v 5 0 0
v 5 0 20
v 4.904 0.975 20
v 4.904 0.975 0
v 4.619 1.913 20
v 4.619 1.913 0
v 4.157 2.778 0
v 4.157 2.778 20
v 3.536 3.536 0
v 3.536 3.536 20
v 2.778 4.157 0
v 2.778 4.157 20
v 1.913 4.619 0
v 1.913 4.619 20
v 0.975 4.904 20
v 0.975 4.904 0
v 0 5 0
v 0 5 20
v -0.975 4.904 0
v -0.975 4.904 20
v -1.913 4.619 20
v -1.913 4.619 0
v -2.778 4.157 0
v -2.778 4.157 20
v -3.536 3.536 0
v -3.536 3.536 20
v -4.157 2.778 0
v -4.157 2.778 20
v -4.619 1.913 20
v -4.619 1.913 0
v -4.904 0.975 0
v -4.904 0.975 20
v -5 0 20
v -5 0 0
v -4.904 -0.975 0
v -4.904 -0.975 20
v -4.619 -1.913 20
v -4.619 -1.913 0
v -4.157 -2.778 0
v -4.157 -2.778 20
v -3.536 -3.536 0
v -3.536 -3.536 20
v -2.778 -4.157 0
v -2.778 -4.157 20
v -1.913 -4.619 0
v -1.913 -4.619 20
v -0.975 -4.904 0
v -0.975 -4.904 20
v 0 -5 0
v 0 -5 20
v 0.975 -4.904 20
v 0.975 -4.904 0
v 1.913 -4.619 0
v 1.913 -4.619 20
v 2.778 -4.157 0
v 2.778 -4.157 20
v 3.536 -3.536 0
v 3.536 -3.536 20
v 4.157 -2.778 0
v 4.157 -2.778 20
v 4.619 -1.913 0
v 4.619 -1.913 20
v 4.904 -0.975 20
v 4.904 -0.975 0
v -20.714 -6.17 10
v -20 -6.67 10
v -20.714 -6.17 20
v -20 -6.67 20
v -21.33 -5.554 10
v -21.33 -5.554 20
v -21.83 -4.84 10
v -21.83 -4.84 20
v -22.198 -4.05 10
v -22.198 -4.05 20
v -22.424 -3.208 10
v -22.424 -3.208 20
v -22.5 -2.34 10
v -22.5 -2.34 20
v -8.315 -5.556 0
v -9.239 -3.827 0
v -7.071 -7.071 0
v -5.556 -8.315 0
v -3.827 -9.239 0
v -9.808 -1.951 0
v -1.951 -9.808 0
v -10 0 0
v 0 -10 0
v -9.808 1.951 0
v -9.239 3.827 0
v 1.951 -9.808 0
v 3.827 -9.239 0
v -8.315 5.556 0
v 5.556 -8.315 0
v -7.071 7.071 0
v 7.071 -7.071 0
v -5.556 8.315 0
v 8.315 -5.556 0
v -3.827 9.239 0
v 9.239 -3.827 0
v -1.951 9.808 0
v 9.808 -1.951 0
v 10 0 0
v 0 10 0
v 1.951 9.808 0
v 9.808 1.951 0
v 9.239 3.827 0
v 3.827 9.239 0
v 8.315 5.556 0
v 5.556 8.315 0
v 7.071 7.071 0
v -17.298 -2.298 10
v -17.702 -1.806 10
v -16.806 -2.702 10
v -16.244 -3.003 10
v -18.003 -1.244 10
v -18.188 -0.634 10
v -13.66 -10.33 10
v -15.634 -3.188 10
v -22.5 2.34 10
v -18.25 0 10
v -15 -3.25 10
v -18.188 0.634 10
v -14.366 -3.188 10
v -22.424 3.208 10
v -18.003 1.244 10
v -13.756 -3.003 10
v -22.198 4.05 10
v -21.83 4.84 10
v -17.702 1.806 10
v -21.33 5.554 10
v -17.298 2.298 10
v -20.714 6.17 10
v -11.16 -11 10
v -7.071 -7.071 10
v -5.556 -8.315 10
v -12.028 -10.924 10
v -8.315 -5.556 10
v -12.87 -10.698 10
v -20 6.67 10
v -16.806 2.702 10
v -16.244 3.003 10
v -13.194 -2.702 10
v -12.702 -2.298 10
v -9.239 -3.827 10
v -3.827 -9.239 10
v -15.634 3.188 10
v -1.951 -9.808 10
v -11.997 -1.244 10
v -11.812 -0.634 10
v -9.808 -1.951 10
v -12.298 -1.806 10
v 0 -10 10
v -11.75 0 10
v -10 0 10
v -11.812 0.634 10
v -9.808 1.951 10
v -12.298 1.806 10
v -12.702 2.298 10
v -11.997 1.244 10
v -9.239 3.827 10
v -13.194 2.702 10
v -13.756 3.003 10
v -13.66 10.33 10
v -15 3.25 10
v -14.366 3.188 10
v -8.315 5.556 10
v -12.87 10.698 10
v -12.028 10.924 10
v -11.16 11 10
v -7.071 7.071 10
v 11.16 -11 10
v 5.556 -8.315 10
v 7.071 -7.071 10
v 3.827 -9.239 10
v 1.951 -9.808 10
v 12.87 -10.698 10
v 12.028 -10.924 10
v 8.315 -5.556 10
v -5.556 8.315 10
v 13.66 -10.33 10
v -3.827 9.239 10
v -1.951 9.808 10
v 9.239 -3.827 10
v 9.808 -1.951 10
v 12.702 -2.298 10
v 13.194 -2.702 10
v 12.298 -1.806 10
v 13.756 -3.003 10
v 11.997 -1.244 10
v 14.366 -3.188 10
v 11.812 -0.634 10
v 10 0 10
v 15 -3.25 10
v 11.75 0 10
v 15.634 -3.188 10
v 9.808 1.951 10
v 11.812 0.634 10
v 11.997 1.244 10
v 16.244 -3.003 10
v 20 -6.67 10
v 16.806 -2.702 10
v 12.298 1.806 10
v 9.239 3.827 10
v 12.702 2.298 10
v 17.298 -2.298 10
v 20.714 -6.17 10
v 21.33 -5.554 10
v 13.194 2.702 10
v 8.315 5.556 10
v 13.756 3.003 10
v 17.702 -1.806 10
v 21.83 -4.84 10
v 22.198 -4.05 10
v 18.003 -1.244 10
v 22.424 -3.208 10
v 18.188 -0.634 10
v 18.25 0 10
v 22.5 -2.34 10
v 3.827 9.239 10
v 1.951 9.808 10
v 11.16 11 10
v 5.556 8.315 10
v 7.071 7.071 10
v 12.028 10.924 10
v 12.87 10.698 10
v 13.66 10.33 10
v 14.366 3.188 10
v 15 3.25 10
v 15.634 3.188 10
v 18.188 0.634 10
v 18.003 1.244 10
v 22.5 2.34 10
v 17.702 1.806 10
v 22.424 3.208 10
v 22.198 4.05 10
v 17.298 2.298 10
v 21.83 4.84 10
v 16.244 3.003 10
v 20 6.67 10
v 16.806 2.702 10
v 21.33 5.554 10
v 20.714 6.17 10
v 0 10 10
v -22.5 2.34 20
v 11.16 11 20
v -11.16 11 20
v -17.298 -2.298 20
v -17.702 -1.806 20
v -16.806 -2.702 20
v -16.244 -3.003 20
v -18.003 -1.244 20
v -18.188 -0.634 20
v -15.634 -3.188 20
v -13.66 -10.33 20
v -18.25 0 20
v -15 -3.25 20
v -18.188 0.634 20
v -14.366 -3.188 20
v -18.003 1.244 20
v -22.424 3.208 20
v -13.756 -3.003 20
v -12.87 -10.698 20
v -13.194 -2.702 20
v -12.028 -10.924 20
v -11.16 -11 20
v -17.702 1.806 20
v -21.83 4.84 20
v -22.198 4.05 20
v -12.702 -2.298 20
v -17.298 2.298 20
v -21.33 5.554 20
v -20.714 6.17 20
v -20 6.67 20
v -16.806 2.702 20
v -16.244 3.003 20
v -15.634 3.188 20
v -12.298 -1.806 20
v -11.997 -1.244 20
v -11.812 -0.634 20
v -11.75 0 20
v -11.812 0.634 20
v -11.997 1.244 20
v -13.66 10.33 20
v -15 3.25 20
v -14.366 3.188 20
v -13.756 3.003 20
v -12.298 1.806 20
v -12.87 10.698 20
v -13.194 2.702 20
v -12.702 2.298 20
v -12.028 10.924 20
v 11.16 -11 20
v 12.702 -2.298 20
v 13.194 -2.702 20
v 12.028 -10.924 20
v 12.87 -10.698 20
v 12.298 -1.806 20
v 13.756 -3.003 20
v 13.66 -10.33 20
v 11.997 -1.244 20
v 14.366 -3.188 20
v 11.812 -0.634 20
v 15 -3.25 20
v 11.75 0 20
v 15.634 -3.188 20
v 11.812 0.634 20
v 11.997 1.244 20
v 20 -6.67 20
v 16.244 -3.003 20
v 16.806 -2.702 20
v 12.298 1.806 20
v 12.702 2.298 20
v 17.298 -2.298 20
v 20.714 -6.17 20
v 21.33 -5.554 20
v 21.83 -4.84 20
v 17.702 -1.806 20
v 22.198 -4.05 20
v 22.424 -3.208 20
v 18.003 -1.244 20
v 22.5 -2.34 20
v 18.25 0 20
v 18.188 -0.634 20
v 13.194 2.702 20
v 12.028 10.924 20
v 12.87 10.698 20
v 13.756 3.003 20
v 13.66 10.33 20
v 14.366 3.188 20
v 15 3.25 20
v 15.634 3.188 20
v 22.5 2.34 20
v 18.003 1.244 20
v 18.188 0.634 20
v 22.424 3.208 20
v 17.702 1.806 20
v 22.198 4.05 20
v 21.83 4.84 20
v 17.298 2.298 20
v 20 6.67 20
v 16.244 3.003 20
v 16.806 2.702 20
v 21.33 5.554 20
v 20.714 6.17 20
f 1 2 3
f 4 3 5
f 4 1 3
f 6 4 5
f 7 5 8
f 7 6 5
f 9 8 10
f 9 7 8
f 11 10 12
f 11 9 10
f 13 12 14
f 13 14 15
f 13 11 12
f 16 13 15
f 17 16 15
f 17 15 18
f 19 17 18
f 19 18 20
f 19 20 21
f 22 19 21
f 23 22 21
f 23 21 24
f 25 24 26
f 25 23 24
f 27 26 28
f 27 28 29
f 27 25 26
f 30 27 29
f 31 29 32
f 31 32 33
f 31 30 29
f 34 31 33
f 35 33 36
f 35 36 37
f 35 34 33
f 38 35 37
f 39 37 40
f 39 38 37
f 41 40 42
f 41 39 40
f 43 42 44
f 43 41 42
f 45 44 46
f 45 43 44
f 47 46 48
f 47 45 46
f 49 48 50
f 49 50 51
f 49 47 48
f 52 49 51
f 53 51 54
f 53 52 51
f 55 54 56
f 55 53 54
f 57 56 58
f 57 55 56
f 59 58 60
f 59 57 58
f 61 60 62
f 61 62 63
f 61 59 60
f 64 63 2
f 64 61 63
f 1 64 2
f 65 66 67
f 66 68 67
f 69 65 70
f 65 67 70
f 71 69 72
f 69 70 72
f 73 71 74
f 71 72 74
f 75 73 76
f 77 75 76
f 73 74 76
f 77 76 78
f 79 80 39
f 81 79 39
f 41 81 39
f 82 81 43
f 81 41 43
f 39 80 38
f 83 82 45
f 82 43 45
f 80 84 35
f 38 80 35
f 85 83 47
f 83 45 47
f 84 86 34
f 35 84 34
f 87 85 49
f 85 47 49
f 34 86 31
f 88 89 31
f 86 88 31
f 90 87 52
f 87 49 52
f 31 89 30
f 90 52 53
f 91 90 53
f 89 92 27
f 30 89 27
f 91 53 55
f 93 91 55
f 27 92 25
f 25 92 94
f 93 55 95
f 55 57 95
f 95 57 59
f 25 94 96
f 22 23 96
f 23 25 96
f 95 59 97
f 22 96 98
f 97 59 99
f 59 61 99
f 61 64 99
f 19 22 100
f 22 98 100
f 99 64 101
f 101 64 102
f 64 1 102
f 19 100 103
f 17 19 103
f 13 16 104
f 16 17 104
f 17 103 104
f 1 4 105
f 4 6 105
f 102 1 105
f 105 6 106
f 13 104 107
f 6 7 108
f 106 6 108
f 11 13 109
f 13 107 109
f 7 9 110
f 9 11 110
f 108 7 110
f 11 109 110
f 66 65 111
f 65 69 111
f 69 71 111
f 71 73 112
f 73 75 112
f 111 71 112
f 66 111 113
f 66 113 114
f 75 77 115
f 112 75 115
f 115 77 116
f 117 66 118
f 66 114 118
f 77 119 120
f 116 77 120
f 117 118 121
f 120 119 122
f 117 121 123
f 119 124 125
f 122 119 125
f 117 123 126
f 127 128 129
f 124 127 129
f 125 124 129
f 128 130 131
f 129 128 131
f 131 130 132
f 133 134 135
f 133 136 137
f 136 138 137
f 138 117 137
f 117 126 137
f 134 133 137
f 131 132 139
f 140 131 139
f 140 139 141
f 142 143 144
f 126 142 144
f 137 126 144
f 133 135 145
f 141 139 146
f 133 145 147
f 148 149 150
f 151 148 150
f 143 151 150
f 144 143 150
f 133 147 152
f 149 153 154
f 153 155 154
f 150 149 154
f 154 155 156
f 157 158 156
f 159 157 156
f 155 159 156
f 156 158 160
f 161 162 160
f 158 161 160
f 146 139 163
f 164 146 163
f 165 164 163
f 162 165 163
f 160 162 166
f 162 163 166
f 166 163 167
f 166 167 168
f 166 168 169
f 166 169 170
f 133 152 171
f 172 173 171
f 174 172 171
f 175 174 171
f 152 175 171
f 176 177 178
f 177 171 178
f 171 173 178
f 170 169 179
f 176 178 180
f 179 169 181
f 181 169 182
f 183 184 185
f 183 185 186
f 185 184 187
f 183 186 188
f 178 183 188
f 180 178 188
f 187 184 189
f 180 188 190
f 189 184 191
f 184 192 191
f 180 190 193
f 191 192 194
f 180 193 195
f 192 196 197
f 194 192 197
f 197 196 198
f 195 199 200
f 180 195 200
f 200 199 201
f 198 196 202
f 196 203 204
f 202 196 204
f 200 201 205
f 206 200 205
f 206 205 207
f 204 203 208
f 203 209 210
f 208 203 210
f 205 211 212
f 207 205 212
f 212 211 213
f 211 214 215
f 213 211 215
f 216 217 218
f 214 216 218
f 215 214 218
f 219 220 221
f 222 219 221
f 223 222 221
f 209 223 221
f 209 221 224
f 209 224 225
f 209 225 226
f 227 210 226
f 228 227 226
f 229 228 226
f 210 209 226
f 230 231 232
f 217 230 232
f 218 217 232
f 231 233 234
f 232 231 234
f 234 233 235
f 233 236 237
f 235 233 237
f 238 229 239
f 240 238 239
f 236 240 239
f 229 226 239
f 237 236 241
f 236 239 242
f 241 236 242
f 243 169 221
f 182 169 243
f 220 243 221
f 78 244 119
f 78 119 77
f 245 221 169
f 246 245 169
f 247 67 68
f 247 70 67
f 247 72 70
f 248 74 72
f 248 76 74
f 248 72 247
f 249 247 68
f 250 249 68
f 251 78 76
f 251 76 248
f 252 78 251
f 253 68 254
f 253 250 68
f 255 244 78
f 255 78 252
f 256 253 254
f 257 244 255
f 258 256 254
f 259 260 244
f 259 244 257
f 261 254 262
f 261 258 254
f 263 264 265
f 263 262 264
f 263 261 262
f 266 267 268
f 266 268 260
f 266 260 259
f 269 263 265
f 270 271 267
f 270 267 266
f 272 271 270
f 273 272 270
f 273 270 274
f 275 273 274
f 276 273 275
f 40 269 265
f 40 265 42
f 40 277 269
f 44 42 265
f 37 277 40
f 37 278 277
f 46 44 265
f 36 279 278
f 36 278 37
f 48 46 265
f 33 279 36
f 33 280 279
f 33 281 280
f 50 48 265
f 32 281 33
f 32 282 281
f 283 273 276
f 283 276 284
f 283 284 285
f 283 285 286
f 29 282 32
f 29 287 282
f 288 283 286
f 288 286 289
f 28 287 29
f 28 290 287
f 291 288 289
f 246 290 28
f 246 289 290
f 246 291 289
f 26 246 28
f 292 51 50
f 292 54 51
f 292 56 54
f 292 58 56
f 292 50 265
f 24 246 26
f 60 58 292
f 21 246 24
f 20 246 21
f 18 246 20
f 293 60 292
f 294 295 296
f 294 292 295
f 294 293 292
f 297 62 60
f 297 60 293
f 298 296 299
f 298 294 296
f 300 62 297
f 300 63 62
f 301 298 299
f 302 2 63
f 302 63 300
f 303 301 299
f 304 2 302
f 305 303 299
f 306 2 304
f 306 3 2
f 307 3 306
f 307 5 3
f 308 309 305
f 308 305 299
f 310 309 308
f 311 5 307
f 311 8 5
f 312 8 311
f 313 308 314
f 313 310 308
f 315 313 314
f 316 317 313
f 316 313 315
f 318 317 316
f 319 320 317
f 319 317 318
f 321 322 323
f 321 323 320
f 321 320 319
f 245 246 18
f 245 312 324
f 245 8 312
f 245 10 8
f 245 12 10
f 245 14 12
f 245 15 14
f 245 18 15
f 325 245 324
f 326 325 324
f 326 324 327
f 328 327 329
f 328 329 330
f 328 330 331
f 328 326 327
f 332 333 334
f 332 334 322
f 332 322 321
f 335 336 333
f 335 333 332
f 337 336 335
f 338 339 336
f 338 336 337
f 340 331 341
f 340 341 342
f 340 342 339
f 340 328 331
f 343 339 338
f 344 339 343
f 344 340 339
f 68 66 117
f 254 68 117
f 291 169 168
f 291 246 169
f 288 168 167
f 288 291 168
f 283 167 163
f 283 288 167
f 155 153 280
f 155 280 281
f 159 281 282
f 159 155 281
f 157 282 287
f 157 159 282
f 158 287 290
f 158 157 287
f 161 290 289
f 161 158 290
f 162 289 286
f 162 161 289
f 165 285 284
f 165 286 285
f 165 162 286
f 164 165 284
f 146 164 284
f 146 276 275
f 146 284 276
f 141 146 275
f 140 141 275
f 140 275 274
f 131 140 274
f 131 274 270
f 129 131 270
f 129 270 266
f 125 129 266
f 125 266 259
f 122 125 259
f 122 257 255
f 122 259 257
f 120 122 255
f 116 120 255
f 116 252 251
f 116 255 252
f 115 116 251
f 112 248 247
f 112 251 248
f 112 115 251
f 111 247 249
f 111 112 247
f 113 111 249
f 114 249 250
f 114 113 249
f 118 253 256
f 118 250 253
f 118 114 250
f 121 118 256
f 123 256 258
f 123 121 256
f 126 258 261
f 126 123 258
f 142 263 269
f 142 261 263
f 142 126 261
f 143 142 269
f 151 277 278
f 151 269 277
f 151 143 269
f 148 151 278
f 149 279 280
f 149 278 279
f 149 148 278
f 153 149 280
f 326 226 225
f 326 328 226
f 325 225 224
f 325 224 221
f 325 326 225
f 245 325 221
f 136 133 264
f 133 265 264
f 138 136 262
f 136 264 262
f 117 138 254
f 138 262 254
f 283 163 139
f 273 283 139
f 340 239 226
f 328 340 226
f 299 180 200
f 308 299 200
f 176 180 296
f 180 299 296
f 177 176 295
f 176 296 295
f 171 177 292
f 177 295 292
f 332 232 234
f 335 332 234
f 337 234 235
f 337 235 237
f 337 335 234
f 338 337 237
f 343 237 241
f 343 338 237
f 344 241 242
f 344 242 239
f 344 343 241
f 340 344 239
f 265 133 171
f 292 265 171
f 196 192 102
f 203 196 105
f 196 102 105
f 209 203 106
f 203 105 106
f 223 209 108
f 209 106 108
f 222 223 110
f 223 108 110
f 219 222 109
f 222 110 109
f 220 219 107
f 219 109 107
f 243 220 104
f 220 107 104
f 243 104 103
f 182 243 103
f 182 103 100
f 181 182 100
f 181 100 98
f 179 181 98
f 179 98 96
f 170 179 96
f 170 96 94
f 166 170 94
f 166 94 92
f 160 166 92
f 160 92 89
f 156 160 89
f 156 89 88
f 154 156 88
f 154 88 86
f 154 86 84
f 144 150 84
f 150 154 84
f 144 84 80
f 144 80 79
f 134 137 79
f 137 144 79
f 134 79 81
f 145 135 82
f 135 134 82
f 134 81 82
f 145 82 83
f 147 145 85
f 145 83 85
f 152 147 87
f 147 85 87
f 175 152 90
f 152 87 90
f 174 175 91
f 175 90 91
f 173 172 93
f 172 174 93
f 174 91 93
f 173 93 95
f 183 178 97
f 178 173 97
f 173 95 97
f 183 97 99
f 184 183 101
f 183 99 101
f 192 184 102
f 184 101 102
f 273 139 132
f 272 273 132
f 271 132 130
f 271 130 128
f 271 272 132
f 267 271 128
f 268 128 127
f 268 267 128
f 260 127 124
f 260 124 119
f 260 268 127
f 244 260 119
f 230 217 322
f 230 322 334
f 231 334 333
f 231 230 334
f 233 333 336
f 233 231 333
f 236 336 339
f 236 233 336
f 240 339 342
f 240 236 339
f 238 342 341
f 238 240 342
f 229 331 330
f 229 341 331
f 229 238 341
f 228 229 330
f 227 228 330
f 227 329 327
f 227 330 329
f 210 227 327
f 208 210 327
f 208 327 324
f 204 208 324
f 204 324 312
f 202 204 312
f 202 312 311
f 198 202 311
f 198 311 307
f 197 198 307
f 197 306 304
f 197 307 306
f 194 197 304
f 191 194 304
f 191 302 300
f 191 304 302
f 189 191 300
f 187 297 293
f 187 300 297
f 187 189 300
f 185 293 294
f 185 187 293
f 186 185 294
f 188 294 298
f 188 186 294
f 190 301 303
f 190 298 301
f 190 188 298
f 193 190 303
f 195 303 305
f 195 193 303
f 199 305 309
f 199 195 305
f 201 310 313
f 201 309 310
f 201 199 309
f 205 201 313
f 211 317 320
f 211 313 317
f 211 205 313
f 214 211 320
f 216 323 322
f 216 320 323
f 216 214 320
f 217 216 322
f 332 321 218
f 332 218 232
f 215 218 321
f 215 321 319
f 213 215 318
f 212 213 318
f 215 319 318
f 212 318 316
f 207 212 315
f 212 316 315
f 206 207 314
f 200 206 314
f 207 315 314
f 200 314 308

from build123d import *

# Parameters (mm, degrees)
ESQUISSE1_R                  = 10
ESQUISSE1_R_2                = 5
BOSS_EXTRU_1_DEPTH           = 20
BOSS_EXTRU_2_START           = -10
ESQUISSE2_R                  = 5
BOSS_EXTRU_2_DEPTH           = 10
ENL_V_MAT_EXTRU_1_DEPTH      = 33.050741021
ENL_V_MAT_EXTRU_1_DEPTH_BACK = 33.050741021
ESQUISSE3_R                  = 3.25
CONG_1_R                     = 5


with BuildPart() as part:
    # Esquisse1 → Boss.-Extru.1 (new body)
    with BuildSketch(Plane.XY):
        Circle(ESQUISSE1_R)
        Circle(ESQUISSE1_R_2, mode=Mode.SUBTRACT)
    extrude(amount=BOSS_EXTRU_1_DEPTH)

    # Esquisse2 → Boss.-Extru.2 (add)
    with BuildSketch(Plane.XY.offset(20).offset(BOSS_EXTRU_2_START)):
        Polygon((22.5, -5.226497308), (22.5, 5.226497308), (12.5, 11), (-12.5, 11), (-22.5, 5.226497308), (-22.5, -5.226497308), (-12.5, -11), (12.5, -11), align=None)
        Circle(ESQUISSE2_R, mode=Mode.SUBTRACT)
    extrude(amount=BOSS_EXTRU_2_DEPTH)

    # Esquisse3 → Enlèv. mat.-Extru.1 (cut, two sides: drawn at the far end of the back side and taken through both)
    with BuildSketch(Plane.XY.offset(20).offset(-ENL_V_MAT_EXTRU_1_DEPTH_BACK)):
        with Locations((15, 0)):
            Circle(ESQUISSE3_R)
        with Locations((-15, 0)):
            Circle(ESQUISSE3_R)
    extrude(amount=ENL_V_MAT_EXTRU_1_DEPTH + ENL_V_MAT_EXTRU_1_DEPTH_BACK, mode=Mode.SUBTRACT)

    # Congé1
    cong_1_edges = [part.edges().sort_by_distance(p)[0] for p in [
        (22.5, -5.226497308, 15),
        (12.5, -11, 15),
        (-12.5, -11, 15),
        (-22.5, -5.226497308, 15),
        (-22.5, 5.226497308, 15),
        (-12.5, 11, 15),
        (12.5, 11, 15),
        (22.5, 5.226497308, 15),
    ]]
    fillet(cong_1_edges, radius=CONG_1_R)


solid = part.part
